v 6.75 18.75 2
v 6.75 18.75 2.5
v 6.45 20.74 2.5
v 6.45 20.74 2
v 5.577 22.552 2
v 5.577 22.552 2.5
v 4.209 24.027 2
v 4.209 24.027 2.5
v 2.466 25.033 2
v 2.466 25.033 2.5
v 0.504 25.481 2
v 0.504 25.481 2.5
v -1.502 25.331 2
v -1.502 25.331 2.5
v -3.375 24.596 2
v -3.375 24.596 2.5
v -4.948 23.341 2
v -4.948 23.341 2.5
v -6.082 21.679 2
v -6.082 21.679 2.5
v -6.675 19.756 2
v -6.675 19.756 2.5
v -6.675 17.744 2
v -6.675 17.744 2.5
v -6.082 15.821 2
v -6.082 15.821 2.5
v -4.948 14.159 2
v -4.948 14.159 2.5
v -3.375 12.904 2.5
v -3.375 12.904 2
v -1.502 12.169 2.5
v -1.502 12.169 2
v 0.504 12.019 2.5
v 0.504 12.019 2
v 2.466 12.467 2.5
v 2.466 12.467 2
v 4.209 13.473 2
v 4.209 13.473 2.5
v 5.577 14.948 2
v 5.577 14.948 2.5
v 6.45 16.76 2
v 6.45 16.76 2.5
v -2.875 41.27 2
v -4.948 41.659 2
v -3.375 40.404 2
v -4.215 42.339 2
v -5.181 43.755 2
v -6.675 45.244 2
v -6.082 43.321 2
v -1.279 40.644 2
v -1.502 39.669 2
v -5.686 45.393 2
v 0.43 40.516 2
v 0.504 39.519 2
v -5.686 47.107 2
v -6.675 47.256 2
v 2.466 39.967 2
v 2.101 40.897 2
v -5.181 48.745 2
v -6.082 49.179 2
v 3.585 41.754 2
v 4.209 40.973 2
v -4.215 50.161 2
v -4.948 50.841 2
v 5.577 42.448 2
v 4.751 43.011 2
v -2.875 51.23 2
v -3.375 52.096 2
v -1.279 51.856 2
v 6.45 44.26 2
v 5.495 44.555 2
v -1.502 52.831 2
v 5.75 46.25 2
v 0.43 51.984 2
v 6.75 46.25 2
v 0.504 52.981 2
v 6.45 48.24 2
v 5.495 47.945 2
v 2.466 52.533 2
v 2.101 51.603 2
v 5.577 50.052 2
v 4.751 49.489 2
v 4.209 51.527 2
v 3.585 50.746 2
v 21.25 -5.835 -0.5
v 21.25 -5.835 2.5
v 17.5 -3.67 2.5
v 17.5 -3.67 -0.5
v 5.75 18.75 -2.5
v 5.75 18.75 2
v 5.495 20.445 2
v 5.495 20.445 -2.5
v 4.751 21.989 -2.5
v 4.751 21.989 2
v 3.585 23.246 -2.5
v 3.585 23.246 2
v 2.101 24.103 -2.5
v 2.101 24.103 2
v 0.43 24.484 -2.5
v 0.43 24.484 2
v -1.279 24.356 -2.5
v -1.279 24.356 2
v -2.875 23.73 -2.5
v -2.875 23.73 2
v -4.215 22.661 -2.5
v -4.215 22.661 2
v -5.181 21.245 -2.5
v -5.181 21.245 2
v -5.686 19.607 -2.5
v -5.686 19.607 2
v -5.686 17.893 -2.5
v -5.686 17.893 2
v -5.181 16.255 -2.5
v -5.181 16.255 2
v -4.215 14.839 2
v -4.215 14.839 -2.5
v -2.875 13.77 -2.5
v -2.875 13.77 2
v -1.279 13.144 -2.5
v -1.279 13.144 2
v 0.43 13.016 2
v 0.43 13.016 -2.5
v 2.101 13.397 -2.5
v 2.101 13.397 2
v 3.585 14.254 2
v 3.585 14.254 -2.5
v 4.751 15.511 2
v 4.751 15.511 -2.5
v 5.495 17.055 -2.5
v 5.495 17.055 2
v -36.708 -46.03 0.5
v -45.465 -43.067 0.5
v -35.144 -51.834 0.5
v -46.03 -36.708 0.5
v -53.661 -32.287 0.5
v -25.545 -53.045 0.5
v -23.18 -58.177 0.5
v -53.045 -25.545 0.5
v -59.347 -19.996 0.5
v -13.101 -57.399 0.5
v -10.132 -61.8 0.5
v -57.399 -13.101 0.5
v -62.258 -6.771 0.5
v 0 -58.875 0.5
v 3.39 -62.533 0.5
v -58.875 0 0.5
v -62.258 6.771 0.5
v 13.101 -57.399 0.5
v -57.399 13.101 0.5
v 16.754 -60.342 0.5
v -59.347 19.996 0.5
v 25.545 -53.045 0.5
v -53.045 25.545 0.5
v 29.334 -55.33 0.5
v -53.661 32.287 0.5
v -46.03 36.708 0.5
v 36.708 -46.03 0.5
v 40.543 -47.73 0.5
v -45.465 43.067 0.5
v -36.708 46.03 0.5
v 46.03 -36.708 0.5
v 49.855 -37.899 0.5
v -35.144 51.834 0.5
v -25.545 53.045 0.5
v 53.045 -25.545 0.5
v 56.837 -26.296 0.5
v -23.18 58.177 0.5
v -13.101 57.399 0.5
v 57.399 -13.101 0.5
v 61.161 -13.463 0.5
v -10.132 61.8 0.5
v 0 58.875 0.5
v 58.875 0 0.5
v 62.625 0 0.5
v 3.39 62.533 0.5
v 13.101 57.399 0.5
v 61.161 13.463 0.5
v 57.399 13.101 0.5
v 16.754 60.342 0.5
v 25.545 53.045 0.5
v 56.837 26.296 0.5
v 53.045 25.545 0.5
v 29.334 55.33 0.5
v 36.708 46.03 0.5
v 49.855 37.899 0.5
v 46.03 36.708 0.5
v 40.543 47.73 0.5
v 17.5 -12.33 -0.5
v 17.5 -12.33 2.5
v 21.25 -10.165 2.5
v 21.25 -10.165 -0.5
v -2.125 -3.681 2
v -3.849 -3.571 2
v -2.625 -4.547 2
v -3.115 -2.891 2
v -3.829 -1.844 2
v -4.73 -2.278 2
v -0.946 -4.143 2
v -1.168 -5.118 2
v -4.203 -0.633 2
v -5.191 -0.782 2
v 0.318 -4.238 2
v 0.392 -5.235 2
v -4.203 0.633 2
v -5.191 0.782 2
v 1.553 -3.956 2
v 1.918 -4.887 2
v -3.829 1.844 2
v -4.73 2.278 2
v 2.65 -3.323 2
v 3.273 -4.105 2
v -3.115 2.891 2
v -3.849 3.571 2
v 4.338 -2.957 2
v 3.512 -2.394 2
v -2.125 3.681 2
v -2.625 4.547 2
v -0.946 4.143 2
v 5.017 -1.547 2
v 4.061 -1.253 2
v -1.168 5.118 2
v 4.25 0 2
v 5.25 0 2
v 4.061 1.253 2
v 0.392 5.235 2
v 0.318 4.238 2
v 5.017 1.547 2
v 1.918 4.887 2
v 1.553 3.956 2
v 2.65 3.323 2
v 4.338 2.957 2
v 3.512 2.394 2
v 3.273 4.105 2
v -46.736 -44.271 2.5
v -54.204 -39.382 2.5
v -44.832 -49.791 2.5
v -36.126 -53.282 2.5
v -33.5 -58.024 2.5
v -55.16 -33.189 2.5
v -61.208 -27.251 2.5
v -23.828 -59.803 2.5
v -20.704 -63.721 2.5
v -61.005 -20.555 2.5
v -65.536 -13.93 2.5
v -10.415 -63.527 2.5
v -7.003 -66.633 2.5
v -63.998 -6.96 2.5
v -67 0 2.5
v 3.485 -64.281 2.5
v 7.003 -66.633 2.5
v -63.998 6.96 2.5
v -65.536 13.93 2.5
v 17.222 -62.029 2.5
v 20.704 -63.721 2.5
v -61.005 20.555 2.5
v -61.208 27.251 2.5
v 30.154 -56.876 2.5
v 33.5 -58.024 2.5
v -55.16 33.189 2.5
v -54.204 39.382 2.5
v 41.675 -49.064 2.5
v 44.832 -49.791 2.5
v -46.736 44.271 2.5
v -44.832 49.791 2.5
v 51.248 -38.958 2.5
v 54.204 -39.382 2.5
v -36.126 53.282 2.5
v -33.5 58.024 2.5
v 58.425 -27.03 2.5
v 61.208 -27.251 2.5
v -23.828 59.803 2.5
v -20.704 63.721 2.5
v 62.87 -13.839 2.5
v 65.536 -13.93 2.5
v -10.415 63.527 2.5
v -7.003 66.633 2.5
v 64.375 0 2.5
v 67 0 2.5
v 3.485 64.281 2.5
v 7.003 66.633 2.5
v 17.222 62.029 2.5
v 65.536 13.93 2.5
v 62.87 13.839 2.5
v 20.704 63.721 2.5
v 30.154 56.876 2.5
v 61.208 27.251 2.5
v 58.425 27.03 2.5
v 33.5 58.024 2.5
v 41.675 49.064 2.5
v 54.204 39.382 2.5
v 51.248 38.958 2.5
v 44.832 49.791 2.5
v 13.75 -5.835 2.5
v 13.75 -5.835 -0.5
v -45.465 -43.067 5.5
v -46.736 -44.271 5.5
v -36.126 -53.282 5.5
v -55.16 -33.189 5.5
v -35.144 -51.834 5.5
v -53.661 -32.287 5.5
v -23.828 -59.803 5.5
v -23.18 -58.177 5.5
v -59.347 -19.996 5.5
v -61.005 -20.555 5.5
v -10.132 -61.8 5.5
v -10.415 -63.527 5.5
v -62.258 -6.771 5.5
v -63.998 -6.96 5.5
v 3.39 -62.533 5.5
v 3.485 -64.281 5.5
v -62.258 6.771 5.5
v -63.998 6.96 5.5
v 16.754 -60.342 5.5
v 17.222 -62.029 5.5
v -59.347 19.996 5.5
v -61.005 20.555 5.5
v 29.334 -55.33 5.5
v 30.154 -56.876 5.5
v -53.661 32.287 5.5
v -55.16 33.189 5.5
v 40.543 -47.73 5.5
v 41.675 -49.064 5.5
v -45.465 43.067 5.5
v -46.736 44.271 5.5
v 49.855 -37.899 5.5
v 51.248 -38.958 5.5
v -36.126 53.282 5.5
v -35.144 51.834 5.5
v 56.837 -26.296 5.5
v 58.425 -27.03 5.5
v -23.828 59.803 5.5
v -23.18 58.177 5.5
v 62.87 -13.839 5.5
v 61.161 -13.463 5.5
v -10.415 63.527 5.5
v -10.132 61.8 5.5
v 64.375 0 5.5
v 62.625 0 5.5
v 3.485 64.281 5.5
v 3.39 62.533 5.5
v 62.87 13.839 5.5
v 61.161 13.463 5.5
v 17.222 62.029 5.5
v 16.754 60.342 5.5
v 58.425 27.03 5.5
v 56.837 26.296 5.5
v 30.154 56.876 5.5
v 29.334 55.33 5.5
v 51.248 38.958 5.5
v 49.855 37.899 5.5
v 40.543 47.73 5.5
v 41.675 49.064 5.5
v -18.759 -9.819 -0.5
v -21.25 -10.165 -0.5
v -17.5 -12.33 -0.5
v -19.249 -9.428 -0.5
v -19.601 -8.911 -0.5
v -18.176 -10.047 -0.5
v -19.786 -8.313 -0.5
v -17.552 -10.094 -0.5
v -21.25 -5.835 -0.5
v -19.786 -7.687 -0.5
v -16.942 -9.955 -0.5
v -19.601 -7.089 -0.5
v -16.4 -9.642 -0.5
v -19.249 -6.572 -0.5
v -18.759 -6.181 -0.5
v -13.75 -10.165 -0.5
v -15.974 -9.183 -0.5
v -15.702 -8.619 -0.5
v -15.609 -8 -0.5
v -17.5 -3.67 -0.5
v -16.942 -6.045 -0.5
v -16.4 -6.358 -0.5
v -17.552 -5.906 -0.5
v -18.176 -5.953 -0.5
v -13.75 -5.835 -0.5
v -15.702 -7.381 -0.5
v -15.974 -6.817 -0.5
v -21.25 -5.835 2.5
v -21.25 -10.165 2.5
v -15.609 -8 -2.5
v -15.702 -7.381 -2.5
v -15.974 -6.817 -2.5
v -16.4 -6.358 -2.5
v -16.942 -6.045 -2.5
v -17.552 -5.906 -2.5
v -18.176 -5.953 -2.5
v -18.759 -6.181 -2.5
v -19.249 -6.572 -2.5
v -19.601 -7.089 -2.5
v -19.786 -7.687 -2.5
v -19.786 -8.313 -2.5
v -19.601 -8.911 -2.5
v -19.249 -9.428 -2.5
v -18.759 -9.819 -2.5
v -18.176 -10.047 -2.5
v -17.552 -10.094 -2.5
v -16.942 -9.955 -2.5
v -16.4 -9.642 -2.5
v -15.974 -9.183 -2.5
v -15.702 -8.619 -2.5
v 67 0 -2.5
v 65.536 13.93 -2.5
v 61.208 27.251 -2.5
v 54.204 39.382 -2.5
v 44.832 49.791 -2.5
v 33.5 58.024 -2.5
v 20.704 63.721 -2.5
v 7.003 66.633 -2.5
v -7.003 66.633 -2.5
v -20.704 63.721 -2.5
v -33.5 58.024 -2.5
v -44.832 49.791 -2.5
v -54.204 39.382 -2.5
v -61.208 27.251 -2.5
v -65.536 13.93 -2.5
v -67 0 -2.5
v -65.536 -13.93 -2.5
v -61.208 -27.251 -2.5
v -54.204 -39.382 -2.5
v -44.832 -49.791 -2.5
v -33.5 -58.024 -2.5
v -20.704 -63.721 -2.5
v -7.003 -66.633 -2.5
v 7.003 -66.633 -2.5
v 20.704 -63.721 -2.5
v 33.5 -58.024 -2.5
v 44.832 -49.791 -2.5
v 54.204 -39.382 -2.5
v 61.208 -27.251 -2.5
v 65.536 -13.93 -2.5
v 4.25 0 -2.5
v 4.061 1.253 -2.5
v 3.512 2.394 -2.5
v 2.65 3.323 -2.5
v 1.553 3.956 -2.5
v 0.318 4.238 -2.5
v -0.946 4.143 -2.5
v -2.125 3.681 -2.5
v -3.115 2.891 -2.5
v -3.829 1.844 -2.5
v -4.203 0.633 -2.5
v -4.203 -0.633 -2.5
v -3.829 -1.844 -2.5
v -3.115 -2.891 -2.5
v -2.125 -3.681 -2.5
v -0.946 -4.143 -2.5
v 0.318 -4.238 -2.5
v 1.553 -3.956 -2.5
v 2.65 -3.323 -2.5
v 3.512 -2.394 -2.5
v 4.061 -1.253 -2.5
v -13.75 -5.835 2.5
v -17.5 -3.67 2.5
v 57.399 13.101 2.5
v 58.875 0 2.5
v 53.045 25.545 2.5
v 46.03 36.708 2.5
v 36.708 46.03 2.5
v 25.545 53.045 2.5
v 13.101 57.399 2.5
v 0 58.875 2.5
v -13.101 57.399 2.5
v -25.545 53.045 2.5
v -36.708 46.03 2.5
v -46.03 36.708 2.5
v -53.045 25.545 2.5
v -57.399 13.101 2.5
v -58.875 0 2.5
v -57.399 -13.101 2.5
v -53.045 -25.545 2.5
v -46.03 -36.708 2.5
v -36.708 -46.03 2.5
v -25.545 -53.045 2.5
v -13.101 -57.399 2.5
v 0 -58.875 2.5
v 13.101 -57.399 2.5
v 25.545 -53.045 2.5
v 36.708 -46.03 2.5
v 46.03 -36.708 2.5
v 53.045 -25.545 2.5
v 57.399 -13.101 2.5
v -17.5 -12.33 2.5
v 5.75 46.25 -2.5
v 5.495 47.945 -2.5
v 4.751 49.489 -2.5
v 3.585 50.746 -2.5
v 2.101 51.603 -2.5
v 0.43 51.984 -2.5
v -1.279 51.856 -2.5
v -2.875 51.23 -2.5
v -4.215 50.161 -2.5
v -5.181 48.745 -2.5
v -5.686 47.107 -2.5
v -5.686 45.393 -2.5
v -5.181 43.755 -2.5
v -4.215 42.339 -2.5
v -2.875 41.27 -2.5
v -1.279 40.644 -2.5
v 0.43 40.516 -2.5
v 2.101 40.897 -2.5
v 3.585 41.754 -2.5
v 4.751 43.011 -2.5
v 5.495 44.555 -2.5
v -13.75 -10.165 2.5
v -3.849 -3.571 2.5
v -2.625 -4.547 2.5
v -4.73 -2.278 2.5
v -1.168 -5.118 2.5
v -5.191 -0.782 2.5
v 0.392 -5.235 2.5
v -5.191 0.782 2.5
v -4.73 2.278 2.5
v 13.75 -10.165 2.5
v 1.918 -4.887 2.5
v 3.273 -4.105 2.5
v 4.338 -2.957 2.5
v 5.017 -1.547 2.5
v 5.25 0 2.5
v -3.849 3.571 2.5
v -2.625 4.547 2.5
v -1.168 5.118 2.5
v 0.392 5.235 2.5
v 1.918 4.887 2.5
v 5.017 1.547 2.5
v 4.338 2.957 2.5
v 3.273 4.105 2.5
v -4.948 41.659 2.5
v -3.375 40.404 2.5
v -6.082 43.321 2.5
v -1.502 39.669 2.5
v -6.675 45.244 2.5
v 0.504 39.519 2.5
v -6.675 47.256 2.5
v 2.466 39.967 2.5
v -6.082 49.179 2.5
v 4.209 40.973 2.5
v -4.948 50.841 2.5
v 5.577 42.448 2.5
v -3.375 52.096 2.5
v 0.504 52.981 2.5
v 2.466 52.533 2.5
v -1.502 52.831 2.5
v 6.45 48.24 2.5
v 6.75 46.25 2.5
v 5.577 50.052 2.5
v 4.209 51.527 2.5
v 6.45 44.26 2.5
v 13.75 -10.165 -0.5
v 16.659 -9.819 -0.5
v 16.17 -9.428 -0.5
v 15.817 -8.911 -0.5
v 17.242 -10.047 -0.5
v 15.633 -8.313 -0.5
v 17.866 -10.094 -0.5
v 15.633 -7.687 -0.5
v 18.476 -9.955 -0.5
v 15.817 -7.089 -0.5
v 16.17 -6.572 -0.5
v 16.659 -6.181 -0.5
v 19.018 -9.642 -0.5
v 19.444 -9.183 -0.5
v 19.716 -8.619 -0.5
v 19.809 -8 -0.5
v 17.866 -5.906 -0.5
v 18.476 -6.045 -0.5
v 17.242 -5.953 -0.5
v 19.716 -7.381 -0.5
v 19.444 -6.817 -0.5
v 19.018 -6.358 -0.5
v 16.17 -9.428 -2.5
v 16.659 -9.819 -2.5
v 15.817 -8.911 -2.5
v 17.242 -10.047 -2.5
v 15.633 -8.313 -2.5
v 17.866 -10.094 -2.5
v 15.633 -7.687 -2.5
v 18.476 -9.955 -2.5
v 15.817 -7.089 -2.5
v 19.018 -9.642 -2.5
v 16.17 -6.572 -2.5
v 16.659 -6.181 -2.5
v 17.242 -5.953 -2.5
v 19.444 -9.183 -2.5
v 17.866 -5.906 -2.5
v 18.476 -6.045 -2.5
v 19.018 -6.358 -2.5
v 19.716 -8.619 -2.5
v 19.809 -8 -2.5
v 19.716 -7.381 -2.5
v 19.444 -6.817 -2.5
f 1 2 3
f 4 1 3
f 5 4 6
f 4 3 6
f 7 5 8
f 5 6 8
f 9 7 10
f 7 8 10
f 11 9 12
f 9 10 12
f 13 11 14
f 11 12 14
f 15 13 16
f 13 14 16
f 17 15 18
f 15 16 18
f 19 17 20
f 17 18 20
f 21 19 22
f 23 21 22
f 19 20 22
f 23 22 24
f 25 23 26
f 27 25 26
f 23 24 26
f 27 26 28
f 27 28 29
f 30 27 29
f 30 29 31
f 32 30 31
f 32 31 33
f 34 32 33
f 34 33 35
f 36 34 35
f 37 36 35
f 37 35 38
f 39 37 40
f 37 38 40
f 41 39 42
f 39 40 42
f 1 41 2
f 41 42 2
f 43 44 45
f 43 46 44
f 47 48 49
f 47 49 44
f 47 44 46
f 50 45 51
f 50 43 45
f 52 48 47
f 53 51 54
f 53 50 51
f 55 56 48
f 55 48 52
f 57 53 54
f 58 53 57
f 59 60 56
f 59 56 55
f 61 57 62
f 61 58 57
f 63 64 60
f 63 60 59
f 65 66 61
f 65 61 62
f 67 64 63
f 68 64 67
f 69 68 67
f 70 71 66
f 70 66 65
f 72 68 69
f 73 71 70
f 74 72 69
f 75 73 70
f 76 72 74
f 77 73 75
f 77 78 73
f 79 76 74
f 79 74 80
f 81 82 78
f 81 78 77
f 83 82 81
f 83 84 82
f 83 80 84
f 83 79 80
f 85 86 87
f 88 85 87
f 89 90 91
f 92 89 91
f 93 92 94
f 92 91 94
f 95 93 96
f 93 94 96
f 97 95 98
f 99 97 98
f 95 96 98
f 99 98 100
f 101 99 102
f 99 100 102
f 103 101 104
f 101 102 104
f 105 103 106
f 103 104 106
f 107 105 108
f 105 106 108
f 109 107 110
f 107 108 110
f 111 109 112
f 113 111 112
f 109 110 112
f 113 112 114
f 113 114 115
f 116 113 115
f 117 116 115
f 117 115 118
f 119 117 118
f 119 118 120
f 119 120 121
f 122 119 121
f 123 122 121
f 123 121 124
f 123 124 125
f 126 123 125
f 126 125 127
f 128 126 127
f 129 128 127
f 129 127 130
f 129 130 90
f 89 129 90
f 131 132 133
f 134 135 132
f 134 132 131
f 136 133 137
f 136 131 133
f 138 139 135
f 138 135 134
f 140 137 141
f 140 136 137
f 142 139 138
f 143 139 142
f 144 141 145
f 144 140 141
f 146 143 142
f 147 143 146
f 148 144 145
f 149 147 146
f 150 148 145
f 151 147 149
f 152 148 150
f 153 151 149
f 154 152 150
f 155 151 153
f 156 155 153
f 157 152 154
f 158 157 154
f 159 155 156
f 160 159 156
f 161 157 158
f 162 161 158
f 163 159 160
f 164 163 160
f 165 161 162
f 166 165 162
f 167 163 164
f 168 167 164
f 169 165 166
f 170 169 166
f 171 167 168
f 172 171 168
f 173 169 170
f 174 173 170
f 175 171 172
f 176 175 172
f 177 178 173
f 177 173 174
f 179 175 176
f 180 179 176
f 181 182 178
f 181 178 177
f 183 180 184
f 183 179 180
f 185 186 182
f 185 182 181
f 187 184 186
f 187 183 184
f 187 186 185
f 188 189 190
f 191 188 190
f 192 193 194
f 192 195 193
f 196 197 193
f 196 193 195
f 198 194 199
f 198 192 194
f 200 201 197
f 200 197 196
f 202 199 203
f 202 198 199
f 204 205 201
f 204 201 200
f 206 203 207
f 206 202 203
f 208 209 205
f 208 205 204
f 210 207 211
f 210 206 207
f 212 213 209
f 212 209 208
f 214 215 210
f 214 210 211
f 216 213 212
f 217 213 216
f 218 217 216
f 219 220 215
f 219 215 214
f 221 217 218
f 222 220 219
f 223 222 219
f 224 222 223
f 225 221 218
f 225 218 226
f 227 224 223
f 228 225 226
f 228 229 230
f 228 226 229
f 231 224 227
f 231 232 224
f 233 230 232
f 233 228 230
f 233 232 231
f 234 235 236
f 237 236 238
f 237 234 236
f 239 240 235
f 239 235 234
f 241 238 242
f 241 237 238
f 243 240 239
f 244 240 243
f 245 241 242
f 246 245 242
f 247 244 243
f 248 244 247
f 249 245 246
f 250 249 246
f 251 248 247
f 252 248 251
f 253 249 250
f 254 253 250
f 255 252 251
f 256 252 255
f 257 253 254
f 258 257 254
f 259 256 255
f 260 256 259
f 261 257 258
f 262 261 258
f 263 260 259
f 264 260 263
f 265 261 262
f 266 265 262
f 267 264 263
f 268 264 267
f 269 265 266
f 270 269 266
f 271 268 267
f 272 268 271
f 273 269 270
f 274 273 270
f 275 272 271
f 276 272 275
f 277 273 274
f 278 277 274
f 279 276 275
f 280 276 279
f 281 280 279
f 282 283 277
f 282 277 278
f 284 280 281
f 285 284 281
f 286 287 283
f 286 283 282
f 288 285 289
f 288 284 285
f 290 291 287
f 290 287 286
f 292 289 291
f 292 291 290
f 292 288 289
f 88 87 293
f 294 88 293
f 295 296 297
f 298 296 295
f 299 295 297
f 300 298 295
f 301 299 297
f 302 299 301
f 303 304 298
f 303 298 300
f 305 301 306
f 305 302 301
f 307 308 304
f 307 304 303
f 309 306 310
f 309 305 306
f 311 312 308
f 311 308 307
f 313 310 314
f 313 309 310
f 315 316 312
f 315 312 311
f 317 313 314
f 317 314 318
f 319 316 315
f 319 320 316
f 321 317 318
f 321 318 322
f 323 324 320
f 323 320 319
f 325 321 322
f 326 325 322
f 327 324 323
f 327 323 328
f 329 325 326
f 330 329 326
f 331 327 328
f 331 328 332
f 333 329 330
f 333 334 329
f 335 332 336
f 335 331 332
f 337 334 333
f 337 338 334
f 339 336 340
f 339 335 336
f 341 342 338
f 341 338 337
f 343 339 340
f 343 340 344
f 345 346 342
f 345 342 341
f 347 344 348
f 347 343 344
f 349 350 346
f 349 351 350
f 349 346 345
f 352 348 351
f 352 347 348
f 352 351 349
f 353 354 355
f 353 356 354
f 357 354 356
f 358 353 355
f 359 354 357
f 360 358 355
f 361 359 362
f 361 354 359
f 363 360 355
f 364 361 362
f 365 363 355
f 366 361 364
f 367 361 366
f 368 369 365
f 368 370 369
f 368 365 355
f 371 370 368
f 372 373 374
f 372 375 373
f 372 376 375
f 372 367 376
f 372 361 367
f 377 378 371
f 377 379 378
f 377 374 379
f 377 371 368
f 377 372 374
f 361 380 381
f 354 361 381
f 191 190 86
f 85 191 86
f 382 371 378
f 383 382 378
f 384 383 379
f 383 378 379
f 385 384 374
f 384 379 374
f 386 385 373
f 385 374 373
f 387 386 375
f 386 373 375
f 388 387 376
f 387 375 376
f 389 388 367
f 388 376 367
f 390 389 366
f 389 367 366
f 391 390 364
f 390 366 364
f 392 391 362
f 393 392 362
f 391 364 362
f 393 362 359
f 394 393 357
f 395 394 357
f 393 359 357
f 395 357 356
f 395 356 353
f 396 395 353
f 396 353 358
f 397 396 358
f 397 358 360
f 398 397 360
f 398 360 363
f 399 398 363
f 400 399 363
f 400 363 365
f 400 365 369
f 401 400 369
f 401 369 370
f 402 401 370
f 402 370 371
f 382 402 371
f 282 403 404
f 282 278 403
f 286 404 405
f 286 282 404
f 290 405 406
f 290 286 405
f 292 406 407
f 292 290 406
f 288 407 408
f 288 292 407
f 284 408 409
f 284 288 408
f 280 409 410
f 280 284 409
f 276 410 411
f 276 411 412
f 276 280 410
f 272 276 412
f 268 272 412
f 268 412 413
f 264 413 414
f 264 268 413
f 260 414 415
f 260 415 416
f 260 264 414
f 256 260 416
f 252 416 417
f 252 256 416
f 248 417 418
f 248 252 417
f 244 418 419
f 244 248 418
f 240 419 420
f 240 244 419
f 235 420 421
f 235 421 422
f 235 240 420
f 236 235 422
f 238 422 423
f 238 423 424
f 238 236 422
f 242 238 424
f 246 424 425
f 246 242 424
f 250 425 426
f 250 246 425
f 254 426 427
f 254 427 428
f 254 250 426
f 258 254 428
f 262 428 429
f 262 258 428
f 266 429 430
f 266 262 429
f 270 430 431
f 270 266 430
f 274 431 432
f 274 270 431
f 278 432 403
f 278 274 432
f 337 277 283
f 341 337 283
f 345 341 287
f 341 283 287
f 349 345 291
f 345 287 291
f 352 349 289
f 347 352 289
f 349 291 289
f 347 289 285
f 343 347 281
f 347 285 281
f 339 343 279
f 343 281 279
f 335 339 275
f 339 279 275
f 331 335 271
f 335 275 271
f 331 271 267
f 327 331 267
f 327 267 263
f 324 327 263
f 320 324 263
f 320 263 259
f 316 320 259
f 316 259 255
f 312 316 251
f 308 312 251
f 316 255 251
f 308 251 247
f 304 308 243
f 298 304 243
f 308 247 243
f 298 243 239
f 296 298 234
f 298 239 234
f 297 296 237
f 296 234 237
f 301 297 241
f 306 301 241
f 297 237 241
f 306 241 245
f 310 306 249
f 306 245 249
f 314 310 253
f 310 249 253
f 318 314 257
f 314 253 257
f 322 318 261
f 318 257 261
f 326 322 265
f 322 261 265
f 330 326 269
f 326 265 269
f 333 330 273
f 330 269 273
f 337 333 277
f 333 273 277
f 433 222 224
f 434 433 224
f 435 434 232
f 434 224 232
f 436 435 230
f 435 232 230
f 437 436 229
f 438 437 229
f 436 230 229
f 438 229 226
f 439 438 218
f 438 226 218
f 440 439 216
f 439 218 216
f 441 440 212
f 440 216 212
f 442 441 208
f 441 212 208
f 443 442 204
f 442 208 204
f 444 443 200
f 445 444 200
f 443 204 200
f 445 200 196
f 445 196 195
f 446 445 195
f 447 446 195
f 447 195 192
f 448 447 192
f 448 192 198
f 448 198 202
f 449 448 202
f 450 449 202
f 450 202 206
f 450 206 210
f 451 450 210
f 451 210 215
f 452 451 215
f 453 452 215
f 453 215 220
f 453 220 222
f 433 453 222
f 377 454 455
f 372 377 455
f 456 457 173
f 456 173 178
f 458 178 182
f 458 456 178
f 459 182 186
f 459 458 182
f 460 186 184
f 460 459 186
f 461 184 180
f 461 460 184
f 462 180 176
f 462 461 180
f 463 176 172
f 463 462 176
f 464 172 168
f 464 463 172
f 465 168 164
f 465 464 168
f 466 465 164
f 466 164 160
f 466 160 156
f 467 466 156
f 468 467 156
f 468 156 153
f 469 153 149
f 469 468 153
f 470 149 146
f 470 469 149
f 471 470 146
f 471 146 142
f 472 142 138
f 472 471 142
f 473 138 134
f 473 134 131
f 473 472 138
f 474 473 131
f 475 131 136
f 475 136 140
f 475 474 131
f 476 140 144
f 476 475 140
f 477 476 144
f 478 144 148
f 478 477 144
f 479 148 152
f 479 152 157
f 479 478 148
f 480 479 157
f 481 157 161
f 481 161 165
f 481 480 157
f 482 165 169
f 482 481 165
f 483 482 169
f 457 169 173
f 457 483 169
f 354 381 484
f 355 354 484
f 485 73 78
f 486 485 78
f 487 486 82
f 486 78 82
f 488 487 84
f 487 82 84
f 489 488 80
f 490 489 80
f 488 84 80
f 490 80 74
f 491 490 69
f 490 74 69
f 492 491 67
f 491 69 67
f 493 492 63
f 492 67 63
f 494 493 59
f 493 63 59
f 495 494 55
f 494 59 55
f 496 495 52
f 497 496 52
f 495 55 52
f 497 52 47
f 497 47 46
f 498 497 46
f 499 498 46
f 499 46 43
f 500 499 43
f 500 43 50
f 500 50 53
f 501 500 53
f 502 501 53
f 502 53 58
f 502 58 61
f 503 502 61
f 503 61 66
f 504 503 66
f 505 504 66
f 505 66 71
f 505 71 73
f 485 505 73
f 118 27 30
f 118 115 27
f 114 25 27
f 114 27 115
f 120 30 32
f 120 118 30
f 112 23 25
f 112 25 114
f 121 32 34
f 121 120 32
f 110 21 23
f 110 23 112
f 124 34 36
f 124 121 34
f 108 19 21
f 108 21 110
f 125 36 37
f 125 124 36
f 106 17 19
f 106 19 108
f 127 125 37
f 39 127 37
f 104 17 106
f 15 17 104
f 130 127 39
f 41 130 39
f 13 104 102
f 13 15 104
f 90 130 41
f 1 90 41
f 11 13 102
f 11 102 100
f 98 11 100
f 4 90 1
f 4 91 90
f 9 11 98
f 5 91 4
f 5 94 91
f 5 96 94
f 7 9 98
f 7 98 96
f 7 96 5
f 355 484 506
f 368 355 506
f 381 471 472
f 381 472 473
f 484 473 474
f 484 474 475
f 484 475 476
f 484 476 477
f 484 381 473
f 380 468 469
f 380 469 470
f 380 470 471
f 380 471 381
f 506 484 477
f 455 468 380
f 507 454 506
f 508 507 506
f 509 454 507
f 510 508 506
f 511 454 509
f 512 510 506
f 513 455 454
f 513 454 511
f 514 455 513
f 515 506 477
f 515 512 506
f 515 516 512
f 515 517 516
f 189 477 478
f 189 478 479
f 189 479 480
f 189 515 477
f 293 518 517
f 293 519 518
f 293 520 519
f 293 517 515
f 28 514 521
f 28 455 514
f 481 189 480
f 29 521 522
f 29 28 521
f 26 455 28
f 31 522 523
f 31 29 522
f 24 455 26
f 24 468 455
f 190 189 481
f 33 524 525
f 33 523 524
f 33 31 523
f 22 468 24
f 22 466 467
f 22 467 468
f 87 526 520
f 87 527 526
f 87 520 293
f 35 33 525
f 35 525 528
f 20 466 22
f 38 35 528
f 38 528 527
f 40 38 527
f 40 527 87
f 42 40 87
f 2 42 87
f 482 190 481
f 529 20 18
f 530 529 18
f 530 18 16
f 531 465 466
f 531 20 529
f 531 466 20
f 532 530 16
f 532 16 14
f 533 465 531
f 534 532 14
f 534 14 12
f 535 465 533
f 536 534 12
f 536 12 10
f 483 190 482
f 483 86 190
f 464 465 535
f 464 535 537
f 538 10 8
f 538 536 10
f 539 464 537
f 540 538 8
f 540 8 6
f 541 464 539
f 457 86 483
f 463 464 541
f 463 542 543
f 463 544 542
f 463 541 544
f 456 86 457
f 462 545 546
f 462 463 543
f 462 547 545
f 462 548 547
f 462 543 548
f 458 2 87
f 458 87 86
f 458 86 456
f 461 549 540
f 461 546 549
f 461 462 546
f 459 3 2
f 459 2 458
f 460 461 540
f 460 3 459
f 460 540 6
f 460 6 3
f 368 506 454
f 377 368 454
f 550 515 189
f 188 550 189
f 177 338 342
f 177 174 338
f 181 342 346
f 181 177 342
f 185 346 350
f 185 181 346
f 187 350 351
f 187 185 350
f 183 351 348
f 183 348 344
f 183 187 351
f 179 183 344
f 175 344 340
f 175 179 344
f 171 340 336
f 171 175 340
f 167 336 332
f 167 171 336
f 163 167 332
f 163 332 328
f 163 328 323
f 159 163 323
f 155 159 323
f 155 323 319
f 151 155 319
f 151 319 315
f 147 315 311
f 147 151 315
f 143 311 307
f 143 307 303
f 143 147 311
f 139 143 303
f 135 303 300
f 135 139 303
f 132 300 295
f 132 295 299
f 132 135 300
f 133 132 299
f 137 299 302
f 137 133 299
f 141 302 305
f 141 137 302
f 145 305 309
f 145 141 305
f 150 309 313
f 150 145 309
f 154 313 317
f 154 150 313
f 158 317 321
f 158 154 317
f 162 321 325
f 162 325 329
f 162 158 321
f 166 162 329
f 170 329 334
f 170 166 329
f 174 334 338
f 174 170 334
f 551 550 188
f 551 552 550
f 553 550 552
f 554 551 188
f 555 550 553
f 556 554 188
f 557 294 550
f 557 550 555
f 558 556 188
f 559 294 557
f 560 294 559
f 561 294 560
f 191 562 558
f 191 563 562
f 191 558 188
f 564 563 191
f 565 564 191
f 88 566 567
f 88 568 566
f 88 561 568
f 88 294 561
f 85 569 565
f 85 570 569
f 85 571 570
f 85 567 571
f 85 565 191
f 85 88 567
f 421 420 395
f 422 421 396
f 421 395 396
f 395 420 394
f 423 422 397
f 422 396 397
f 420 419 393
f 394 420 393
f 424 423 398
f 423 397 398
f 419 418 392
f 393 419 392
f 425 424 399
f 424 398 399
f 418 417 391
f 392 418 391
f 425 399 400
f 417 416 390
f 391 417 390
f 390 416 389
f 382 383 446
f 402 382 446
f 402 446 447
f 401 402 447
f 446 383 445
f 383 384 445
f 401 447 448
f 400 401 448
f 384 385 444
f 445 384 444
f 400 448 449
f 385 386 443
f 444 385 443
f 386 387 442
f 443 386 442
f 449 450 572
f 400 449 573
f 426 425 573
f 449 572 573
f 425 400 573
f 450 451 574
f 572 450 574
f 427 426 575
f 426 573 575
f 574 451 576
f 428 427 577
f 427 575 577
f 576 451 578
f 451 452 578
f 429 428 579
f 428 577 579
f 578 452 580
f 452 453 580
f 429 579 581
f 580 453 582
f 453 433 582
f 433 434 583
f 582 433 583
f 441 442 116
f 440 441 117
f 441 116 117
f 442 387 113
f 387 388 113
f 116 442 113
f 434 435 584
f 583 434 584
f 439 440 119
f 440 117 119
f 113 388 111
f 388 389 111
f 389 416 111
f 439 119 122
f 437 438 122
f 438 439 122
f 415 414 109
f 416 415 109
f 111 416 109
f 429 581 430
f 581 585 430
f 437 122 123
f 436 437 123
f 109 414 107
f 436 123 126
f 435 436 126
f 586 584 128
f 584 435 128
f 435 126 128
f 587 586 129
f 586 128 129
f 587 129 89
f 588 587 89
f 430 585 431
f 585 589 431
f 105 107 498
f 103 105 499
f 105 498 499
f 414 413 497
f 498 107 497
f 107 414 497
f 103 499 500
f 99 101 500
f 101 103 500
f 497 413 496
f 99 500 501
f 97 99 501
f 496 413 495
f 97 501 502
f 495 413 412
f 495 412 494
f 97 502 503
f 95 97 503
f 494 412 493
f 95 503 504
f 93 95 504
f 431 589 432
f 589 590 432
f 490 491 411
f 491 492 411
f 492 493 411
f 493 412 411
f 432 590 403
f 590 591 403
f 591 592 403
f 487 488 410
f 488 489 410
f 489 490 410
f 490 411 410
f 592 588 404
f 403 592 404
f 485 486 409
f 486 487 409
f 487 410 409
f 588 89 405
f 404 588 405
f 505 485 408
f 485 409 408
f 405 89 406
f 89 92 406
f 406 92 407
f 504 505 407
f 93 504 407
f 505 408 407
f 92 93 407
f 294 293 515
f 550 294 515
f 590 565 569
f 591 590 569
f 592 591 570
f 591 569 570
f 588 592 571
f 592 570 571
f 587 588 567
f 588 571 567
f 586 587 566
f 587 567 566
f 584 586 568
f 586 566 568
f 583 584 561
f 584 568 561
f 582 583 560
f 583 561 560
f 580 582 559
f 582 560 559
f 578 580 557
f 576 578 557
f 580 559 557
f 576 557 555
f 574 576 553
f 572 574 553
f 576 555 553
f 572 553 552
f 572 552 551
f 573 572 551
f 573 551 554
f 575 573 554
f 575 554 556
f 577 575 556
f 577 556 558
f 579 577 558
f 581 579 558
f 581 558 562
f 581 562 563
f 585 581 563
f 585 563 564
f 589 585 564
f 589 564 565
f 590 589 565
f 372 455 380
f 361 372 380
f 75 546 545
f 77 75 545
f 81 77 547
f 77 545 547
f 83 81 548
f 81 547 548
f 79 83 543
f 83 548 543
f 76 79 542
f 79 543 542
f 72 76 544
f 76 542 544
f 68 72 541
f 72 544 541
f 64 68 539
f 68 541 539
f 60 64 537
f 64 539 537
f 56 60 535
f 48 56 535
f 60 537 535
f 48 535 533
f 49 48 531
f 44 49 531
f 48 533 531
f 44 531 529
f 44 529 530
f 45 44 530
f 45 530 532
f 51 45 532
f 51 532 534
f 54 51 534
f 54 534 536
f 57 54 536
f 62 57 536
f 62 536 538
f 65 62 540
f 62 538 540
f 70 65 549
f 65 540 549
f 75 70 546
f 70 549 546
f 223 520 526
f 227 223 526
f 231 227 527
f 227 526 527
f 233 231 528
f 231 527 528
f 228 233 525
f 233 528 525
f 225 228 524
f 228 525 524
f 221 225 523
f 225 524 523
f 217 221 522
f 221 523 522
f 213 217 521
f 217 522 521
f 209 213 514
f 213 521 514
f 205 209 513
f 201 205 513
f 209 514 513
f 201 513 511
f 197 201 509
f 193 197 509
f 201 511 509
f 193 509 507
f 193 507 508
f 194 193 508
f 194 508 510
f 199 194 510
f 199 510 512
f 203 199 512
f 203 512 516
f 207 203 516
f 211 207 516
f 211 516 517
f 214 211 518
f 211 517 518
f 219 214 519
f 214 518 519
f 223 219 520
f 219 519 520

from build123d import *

# Parameters (mm, degrees)
F0_R      = 67
F1_DEPTH  = 2.5
F3_R      = 64.375
F3_R_2    = 62.625
F4_DEPTH  = 3
F5_R      = 62.625
F5_R_2    = 58.875
F6_DEPTH  = 2
F7_R      = 4.25
F8_DEPTH  = 5.001
F9_R      = 5.75
F10_DEPTH = 5.001
F11_R     = 5.75
F12_DEPTH = 5.001
F14_R     = 2.1
F15_DEPTH = 5.001
F16_R     = 5.25
F18_DEPTH = 0.5
F19_R     = 6.75
F20_DEPTH = 0.5
F11_R_2   = 6.75
F21_DEPTH = 0.5
F22_DEPTH = 3


with BuildPart() as f1:
    # F0 (on Top) → F1 (new body, symmetric)
    with BuildSketch(Plane.XY):
        Circle(F0_R)
    extrude(amount=F1_DEPTH, both=True)

    # F3 (on face) → F4 (join)
    with BuildSketch(Plane.XY.offset(2.5)):
        Circle(F3_R)
        Circle(F3_R_2, mode=Mode.SUBTRACT)
    extrude(amount=F4_DEPTH)

    # F5 (on face) → F6 (cut)
    with BuildSketch(Plane.XY.offset(2.5)):
        Circle(F5_R)
        Circle(F5_R_2, mode=Mode.SUBTRACT)
    extrude(amount=-F6_DEPTH, mode=Mode.SUBTRACT)

    # F7 (on face) → F8 (cut, through all)
    with BuildSketch(Plane.XY.offset(2.5)):
        Circle(F7_R)
    extrude(amount=-F8_DEPTH, mode=Mode.SUBTRACT)

    # F9 (on face) → F10 (cut, through all)
    with BuildSketch(Plane.XY.offset(2.5)):
        with Locations((0, 18.75)):
            Circle(F9_R)
    extrude(amount=-F10_DEPTH, mode=Mode.SUBTRACT)

    # F11 (on face) → F12 (cut, through all)
    with BuildSketch(Plane.XY.offset(2.5)):
        with Locations((0, 46.25)):
            Circle(F11_R)
    extrude(amount=-F12_DEPTH, mode=Mode.SUBTRACT)

    # F14 (on face) → F15 (cut, through all)
    with BuildSketch(Plane.XY.offset(2.5)):
        with Locations((-17.709117, -8)):
            Circle(F14_R)
        with Locations((17.709117, -8)):
            Circle(F14_R)
    extrude(amount=-F15_DEPTH, mode=Mode.SUBTRACT)

    # F16 (on face) → F18 (cut)
    with BuildSketch(Plane.XY.offset(2.5)):
        Circle(F16_R)
    extrude(amount=-F18_DEPTH, mode=Mode.SUBTRACT)

    # F19 (on face) → F20 (cut)
    with BuildSketch(Plane.XY.offset(2.5)):
        with Locations((0, 18.75)):
            Circle(F19_R)
    extrude(amount=-F20_DEPTH, mode=Mode.SUBTRACT)

    # F11 (on face) → F21 (cut)
    with BuildSketch(Plane.XY.offset(2.5)):
        with Locations((0, 46.25)):
            Circle(F11_R_2)
        with Locations((0, 46.25)):
            Circle(F11_R, mode=Mode.SUBTRACT)
    extrude(amount=-F21_DEPTH, mode=Mode.SUBTRACT)

    # F17 (on face) → F22 (cut)
    with BuildSketch(Plane.XY.offset(2.5)):
        Polygon((-13.75, -10.165064), (-13.75, -5.834936), (-17.5, -3.669873), (-21.25, -5.834936), (-21.25, -10.165064), (-17.5, -12.330127), align=None)
        Polygon((21.25, -10.165064), (21.25, -5.834936), (17.5, -3.669873), (13.75, -5.834936), (13.75, -10.165064), (17.5, -12.330127), align=None)
    extrude(amount=-F22_DEPTH, mode=Mode.SUBTRACT)


solid = f1.part
